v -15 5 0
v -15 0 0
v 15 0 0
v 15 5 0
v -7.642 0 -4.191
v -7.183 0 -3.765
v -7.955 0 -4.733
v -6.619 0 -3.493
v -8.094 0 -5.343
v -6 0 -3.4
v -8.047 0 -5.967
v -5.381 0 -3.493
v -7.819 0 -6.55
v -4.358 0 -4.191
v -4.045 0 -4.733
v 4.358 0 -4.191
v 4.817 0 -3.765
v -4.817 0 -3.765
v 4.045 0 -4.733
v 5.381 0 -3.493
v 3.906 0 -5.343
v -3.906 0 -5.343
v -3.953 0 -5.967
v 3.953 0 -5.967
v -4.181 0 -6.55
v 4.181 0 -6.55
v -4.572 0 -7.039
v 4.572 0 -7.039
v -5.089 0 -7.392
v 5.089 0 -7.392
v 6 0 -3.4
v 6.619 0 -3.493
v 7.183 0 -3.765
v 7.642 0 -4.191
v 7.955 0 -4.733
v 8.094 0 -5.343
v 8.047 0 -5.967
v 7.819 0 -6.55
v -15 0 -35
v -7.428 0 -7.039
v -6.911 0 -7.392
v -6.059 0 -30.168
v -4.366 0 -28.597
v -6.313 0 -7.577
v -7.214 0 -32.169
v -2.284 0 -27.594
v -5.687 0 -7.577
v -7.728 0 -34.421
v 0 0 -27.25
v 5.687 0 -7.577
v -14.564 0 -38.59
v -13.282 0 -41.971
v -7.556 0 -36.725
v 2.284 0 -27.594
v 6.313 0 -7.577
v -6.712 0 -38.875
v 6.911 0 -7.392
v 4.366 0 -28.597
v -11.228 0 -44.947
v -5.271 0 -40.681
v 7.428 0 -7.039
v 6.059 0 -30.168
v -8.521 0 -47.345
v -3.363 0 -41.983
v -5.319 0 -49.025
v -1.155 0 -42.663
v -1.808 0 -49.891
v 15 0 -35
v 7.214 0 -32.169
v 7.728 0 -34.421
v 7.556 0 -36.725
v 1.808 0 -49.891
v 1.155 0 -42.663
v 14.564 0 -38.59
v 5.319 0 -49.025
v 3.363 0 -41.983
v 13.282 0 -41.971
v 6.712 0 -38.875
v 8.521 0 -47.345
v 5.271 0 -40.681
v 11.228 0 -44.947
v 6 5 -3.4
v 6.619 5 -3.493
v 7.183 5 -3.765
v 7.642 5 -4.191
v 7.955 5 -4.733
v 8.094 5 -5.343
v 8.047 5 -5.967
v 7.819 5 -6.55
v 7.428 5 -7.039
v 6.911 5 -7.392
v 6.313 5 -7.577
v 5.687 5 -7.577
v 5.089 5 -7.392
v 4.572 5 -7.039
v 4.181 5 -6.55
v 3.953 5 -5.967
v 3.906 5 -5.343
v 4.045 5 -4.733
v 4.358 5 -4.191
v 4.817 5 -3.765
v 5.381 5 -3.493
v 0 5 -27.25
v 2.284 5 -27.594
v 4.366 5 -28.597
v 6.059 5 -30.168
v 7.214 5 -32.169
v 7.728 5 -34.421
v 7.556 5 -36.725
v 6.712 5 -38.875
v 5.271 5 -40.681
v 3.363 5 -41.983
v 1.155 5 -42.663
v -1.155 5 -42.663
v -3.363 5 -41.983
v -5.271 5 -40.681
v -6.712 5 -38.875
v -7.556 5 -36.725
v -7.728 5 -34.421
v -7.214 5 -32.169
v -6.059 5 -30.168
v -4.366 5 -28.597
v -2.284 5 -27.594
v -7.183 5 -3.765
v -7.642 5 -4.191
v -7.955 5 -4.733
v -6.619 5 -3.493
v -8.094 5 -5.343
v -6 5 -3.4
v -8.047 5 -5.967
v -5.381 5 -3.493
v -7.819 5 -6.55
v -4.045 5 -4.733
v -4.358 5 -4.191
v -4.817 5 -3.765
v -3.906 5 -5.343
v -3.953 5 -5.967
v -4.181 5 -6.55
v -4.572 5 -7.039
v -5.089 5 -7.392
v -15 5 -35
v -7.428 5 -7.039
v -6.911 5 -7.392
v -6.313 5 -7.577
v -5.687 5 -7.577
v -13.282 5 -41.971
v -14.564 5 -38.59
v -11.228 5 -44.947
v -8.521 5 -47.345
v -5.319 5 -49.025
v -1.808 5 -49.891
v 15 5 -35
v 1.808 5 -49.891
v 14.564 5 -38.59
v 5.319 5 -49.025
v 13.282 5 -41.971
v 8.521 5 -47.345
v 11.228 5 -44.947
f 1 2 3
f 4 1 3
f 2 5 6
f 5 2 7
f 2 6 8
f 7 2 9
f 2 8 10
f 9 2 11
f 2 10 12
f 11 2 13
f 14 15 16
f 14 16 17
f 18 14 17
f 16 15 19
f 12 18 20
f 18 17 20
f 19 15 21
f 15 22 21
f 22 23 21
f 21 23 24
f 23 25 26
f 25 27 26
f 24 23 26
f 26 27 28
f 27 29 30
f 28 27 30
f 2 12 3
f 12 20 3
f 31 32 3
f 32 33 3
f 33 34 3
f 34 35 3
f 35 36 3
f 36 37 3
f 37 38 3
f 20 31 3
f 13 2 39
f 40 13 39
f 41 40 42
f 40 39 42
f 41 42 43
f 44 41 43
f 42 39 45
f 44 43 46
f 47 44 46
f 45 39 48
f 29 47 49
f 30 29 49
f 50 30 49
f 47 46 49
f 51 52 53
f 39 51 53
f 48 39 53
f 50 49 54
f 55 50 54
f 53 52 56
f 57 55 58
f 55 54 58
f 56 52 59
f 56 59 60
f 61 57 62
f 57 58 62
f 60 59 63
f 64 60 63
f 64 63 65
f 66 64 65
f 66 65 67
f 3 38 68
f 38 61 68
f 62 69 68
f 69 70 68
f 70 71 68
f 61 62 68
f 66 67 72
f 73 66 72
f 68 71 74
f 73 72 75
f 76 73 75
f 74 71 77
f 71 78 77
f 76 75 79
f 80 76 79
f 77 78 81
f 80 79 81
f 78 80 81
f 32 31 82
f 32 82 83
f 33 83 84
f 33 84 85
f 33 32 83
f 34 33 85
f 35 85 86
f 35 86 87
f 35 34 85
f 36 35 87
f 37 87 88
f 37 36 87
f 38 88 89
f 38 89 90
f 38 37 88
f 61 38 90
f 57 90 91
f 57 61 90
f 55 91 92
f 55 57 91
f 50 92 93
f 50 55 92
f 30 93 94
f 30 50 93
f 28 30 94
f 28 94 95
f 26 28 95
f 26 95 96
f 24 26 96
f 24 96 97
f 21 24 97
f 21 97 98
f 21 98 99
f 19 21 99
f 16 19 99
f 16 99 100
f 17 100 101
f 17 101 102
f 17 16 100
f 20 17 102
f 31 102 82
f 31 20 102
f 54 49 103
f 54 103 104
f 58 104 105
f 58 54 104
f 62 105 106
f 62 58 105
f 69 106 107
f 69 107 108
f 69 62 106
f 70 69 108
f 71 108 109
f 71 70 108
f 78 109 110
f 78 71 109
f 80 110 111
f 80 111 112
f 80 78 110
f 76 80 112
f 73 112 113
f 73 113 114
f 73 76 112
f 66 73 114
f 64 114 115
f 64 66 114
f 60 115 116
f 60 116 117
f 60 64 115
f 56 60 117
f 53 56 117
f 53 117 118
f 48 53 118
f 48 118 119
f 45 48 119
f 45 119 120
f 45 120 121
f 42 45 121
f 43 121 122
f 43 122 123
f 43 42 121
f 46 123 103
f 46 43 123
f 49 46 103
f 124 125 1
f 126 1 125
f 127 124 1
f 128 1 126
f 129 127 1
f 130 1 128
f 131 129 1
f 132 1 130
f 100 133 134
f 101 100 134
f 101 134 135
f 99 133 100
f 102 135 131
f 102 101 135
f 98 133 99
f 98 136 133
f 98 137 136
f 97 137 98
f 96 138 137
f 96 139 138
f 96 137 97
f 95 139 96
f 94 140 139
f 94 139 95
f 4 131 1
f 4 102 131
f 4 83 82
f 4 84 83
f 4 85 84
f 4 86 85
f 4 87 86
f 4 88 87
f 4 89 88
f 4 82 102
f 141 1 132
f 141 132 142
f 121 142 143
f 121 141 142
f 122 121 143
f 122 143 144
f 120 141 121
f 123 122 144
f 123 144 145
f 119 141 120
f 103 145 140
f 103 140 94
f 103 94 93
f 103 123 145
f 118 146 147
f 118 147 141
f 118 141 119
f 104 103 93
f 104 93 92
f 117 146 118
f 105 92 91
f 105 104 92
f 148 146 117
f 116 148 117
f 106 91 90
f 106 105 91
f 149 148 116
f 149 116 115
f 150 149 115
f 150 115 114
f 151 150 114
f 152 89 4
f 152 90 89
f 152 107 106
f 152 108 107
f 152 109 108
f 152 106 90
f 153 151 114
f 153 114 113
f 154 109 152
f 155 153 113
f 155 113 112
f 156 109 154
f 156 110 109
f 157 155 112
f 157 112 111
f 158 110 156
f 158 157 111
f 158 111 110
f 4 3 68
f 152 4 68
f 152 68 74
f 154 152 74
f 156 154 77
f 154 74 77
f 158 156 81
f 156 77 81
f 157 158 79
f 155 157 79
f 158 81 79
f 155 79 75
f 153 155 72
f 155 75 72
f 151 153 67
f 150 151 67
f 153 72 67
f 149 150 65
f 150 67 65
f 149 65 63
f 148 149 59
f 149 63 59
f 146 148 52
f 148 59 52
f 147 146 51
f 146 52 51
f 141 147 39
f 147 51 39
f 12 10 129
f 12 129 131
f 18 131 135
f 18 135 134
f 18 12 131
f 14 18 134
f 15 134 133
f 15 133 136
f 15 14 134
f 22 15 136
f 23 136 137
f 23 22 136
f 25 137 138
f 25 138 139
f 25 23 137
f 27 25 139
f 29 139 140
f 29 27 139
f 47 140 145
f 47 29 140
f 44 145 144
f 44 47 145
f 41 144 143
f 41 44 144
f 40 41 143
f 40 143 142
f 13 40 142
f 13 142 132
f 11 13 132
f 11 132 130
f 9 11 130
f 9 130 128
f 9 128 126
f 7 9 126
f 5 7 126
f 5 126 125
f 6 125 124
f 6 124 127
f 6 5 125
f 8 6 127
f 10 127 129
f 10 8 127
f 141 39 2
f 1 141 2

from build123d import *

# Parameters (mm, degrees)
SKETCH_1_R      = 7.75
SKETCH_1_R_2    = 2.1
EXTRUDE_1_DEPTH = 5


with BuildPart() as part:
    # 草图1 → 凸台-拉伸1 (new body)
    with BuildSketch(Plane(origin=(0, 0, 0), x_dir=(1, 0, 0), z_dir=(0, 1, 0))):
        with BuildLine():
            Line((15, 0), (15, 35))
            ThreePointArc((15, 35), (0, 50), (-15, 35))
            Line((-15, 35), (-15, 0))
            Line((-15, 0), (15, 0))
        make_face()
        with Locations(Location((0, 35, 0), (0, 0, 270))):
            Circle(SKETCH_1_R, mode=Mode.SUBTRACT)
        with Locations(Location((-6, 5.5, 0), (0, 0, 270))):
            Circle(SKETCH_1_R_2, mode=Mode.SUBTRACT)
        with Locations(Location((6, 5.5, 0), (0, 0, 270))):
            Circle(SKETCH_1_R_2, mode=Mode.SUBTRACT)
    extrude(amount=EXTRUDE_1_DEPTH)


solid = part.part
